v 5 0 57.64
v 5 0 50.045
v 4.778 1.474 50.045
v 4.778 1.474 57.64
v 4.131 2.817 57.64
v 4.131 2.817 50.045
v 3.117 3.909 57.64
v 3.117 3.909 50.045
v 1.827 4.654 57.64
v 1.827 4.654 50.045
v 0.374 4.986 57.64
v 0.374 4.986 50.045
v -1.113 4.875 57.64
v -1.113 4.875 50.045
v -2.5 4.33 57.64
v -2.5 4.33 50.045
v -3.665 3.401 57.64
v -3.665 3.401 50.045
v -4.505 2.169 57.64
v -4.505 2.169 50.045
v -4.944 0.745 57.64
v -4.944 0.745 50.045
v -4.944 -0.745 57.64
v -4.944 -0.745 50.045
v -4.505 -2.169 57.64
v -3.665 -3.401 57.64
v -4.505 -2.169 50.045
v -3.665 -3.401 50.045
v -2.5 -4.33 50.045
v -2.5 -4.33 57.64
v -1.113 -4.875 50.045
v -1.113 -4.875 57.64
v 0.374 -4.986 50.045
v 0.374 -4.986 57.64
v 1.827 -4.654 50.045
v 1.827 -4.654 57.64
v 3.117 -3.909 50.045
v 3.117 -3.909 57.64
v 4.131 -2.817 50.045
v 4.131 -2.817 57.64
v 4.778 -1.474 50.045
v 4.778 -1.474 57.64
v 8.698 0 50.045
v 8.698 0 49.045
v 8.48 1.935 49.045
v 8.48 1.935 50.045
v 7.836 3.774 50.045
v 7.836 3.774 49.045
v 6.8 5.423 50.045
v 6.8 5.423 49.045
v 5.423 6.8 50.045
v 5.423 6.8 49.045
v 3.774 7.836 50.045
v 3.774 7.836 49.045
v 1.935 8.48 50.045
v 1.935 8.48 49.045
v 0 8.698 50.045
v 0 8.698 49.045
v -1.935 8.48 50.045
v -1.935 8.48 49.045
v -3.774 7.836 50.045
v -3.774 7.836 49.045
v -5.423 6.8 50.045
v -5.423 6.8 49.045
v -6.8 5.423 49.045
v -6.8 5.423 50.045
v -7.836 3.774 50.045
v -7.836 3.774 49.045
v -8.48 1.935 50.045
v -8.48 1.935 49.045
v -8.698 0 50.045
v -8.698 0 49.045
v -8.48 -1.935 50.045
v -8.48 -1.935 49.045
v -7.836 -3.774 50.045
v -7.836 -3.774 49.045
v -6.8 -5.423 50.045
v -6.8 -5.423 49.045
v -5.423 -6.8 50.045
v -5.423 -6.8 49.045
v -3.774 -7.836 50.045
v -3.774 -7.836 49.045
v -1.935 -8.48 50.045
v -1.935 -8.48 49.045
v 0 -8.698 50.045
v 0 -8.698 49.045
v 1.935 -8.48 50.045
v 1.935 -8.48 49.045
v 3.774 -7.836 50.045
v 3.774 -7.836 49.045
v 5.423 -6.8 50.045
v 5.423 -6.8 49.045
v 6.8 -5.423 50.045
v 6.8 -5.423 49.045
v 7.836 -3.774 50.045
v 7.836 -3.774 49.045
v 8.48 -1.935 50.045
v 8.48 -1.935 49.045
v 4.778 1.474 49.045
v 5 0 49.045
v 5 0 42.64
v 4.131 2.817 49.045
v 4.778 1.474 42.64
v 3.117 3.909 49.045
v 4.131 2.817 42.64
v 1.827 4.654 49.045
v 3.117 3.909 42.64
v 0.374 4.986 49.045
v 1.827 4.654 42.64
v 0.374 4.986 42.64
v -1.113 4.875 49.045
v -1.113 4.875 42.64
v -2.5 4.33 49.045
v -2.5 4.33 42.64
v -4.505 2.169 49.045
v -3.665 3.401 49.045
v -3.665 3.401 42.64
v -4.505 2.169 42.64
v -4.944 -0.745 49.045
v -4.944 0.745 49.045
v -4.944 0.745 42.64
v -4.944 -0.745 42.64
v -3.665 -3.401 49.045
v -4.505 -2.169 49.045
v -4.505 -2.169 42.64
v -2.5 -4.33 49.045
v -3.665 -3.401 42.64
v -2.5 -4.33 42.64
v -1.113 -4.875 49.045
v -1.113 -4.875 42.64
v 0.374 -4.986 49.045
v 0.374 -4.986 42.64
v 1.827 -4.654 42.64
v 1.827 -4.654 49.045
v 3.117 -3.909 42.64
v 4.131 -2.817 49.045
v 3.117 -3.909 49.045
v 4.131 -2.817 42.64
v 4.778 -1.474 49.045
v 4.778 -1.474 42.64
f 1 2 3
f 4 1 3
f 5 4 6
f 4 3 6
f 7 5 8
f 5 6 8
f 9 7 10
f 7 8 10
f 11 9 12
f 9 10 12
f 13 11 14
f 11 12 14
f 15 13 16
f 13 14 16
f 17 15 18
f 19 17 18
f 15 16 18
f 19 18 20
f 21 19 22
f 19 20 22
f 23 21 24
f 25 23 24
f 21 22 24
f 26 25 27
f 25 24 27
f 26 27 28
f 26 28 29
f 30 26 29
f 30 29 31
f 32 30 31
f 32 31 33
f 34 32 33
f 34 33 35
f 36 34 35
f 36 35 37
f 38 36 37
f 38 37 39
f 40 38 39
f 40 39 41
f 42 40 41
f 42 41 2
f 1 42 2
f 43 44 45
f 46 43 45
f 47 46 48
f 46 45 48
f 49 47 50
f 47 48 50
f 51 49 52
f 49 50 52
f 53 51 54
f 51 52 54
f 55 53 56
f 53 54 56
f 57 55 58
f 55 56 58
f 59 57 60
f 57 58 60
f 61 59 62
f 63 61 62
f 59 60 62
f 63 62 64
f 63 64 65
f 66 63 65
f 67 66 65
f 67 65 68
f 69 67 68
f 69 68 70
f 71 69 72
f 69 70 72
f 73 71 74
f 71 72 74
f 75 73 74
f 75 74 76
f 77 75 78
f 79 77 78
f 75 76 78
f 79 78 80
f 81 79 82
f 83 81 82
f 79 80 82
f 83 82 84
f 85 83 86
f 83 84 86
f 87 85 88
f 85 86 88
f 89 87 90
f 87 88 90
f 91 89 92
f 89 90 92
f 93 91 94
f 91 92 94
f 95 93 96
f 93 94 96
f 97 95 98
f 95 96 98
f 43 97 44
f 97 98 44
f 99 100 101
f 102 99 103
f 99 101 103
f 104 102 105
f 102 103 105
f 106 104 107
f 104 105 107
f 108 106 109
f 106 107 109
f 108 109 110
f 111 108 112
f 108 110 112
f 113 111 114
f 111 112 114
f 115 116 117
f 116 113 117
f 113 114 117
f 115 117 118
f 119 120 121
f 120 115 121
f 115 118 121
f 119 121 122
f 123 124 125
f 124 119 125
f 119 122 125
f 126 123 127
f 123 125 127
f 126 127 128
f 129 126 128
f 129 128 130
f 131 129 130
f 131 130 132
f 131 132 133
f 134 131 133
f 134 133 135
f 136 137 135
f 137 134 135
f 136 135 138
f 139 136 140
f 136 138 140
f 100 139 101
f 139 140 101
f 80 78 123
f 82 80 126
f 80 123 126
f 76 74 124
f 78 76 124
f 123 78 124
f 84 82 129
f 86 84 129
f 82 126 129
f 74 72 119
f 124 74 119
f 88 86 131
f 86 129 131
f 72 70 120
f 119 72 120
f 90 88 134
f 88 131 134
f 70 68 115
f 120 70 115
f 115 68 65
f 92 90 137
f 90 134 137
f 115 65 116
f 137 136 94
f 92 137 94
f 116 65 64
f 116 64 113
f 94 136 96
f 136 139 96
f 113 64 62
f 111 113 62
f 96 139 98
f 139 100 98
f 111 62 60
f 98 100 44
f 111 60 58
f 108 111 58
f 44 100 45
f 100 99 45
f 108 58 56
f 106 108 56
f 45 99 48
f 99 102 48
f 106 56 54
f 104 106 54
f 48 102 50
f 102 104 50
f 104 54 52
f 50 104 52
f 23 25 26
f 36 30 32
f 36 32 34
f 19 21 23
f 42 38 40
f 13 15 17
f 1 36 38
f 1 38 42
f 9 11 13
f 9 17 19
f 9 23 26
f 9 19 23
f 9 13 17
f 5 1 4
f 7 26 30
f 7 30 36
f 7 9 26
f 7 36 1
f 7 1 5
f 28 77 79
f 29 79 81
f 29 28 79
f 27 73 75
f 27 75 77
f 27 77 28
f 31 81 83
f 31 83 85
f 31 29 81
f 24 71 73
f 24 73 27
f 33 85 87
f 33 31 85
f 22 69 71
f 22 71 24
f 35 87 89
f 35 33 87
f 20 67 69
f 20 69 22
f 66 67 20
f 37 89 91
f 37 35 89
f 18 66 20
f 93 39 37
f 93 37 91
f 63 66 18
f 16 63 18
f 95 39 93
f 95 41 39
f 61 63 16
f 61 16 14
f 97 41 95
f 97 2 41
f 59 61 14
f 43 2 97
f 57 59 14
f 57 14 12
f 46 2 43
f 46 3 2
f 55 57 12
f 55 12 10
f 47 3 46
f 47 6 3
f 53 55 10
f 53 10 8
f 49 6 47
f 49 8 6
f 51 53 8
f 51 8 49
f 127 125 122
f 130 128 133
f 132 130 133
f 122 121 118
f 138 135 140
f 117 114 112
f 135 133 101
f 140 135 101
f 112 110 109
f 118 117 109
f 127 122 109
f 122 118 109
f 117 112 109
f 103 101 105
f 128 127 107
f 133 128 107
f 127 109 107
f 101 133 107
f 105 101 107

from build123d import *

# Parameters (mm, degrees)
CIRCLE001_R    = 8.697725
EXTRUDE_DEPTH  = 1
CYLINDER_R     = 5
CYLINDER_DEPTH = 15


with BuildPart() as neckblock:
    # Circle001 → Extrude (new body)
    with BuildSketch(Plane.XY.offset(57.640399)):
        Circle(CIRCLE001_R)
    extrude(amount=EXTRUDE_DEPTH)


with BuildPart() as neckblock_1:
    # Extrude placement: moved
    add(neckblock.part.moved(Location((0, 0, -8.594981))))


with BuildPart() as neckwithblock:
    # Cylinder → Cylinder (new body)
    with BuildSketch(Plane.XY.offset(42.640399)):
        Circle(CYLINDER_R)
    extrude(amount=CYLINDER_DEPTH)

    # Fusion002: union NeckBlock
    add(neckblock_1.part)


solid = neckwithblock.part
